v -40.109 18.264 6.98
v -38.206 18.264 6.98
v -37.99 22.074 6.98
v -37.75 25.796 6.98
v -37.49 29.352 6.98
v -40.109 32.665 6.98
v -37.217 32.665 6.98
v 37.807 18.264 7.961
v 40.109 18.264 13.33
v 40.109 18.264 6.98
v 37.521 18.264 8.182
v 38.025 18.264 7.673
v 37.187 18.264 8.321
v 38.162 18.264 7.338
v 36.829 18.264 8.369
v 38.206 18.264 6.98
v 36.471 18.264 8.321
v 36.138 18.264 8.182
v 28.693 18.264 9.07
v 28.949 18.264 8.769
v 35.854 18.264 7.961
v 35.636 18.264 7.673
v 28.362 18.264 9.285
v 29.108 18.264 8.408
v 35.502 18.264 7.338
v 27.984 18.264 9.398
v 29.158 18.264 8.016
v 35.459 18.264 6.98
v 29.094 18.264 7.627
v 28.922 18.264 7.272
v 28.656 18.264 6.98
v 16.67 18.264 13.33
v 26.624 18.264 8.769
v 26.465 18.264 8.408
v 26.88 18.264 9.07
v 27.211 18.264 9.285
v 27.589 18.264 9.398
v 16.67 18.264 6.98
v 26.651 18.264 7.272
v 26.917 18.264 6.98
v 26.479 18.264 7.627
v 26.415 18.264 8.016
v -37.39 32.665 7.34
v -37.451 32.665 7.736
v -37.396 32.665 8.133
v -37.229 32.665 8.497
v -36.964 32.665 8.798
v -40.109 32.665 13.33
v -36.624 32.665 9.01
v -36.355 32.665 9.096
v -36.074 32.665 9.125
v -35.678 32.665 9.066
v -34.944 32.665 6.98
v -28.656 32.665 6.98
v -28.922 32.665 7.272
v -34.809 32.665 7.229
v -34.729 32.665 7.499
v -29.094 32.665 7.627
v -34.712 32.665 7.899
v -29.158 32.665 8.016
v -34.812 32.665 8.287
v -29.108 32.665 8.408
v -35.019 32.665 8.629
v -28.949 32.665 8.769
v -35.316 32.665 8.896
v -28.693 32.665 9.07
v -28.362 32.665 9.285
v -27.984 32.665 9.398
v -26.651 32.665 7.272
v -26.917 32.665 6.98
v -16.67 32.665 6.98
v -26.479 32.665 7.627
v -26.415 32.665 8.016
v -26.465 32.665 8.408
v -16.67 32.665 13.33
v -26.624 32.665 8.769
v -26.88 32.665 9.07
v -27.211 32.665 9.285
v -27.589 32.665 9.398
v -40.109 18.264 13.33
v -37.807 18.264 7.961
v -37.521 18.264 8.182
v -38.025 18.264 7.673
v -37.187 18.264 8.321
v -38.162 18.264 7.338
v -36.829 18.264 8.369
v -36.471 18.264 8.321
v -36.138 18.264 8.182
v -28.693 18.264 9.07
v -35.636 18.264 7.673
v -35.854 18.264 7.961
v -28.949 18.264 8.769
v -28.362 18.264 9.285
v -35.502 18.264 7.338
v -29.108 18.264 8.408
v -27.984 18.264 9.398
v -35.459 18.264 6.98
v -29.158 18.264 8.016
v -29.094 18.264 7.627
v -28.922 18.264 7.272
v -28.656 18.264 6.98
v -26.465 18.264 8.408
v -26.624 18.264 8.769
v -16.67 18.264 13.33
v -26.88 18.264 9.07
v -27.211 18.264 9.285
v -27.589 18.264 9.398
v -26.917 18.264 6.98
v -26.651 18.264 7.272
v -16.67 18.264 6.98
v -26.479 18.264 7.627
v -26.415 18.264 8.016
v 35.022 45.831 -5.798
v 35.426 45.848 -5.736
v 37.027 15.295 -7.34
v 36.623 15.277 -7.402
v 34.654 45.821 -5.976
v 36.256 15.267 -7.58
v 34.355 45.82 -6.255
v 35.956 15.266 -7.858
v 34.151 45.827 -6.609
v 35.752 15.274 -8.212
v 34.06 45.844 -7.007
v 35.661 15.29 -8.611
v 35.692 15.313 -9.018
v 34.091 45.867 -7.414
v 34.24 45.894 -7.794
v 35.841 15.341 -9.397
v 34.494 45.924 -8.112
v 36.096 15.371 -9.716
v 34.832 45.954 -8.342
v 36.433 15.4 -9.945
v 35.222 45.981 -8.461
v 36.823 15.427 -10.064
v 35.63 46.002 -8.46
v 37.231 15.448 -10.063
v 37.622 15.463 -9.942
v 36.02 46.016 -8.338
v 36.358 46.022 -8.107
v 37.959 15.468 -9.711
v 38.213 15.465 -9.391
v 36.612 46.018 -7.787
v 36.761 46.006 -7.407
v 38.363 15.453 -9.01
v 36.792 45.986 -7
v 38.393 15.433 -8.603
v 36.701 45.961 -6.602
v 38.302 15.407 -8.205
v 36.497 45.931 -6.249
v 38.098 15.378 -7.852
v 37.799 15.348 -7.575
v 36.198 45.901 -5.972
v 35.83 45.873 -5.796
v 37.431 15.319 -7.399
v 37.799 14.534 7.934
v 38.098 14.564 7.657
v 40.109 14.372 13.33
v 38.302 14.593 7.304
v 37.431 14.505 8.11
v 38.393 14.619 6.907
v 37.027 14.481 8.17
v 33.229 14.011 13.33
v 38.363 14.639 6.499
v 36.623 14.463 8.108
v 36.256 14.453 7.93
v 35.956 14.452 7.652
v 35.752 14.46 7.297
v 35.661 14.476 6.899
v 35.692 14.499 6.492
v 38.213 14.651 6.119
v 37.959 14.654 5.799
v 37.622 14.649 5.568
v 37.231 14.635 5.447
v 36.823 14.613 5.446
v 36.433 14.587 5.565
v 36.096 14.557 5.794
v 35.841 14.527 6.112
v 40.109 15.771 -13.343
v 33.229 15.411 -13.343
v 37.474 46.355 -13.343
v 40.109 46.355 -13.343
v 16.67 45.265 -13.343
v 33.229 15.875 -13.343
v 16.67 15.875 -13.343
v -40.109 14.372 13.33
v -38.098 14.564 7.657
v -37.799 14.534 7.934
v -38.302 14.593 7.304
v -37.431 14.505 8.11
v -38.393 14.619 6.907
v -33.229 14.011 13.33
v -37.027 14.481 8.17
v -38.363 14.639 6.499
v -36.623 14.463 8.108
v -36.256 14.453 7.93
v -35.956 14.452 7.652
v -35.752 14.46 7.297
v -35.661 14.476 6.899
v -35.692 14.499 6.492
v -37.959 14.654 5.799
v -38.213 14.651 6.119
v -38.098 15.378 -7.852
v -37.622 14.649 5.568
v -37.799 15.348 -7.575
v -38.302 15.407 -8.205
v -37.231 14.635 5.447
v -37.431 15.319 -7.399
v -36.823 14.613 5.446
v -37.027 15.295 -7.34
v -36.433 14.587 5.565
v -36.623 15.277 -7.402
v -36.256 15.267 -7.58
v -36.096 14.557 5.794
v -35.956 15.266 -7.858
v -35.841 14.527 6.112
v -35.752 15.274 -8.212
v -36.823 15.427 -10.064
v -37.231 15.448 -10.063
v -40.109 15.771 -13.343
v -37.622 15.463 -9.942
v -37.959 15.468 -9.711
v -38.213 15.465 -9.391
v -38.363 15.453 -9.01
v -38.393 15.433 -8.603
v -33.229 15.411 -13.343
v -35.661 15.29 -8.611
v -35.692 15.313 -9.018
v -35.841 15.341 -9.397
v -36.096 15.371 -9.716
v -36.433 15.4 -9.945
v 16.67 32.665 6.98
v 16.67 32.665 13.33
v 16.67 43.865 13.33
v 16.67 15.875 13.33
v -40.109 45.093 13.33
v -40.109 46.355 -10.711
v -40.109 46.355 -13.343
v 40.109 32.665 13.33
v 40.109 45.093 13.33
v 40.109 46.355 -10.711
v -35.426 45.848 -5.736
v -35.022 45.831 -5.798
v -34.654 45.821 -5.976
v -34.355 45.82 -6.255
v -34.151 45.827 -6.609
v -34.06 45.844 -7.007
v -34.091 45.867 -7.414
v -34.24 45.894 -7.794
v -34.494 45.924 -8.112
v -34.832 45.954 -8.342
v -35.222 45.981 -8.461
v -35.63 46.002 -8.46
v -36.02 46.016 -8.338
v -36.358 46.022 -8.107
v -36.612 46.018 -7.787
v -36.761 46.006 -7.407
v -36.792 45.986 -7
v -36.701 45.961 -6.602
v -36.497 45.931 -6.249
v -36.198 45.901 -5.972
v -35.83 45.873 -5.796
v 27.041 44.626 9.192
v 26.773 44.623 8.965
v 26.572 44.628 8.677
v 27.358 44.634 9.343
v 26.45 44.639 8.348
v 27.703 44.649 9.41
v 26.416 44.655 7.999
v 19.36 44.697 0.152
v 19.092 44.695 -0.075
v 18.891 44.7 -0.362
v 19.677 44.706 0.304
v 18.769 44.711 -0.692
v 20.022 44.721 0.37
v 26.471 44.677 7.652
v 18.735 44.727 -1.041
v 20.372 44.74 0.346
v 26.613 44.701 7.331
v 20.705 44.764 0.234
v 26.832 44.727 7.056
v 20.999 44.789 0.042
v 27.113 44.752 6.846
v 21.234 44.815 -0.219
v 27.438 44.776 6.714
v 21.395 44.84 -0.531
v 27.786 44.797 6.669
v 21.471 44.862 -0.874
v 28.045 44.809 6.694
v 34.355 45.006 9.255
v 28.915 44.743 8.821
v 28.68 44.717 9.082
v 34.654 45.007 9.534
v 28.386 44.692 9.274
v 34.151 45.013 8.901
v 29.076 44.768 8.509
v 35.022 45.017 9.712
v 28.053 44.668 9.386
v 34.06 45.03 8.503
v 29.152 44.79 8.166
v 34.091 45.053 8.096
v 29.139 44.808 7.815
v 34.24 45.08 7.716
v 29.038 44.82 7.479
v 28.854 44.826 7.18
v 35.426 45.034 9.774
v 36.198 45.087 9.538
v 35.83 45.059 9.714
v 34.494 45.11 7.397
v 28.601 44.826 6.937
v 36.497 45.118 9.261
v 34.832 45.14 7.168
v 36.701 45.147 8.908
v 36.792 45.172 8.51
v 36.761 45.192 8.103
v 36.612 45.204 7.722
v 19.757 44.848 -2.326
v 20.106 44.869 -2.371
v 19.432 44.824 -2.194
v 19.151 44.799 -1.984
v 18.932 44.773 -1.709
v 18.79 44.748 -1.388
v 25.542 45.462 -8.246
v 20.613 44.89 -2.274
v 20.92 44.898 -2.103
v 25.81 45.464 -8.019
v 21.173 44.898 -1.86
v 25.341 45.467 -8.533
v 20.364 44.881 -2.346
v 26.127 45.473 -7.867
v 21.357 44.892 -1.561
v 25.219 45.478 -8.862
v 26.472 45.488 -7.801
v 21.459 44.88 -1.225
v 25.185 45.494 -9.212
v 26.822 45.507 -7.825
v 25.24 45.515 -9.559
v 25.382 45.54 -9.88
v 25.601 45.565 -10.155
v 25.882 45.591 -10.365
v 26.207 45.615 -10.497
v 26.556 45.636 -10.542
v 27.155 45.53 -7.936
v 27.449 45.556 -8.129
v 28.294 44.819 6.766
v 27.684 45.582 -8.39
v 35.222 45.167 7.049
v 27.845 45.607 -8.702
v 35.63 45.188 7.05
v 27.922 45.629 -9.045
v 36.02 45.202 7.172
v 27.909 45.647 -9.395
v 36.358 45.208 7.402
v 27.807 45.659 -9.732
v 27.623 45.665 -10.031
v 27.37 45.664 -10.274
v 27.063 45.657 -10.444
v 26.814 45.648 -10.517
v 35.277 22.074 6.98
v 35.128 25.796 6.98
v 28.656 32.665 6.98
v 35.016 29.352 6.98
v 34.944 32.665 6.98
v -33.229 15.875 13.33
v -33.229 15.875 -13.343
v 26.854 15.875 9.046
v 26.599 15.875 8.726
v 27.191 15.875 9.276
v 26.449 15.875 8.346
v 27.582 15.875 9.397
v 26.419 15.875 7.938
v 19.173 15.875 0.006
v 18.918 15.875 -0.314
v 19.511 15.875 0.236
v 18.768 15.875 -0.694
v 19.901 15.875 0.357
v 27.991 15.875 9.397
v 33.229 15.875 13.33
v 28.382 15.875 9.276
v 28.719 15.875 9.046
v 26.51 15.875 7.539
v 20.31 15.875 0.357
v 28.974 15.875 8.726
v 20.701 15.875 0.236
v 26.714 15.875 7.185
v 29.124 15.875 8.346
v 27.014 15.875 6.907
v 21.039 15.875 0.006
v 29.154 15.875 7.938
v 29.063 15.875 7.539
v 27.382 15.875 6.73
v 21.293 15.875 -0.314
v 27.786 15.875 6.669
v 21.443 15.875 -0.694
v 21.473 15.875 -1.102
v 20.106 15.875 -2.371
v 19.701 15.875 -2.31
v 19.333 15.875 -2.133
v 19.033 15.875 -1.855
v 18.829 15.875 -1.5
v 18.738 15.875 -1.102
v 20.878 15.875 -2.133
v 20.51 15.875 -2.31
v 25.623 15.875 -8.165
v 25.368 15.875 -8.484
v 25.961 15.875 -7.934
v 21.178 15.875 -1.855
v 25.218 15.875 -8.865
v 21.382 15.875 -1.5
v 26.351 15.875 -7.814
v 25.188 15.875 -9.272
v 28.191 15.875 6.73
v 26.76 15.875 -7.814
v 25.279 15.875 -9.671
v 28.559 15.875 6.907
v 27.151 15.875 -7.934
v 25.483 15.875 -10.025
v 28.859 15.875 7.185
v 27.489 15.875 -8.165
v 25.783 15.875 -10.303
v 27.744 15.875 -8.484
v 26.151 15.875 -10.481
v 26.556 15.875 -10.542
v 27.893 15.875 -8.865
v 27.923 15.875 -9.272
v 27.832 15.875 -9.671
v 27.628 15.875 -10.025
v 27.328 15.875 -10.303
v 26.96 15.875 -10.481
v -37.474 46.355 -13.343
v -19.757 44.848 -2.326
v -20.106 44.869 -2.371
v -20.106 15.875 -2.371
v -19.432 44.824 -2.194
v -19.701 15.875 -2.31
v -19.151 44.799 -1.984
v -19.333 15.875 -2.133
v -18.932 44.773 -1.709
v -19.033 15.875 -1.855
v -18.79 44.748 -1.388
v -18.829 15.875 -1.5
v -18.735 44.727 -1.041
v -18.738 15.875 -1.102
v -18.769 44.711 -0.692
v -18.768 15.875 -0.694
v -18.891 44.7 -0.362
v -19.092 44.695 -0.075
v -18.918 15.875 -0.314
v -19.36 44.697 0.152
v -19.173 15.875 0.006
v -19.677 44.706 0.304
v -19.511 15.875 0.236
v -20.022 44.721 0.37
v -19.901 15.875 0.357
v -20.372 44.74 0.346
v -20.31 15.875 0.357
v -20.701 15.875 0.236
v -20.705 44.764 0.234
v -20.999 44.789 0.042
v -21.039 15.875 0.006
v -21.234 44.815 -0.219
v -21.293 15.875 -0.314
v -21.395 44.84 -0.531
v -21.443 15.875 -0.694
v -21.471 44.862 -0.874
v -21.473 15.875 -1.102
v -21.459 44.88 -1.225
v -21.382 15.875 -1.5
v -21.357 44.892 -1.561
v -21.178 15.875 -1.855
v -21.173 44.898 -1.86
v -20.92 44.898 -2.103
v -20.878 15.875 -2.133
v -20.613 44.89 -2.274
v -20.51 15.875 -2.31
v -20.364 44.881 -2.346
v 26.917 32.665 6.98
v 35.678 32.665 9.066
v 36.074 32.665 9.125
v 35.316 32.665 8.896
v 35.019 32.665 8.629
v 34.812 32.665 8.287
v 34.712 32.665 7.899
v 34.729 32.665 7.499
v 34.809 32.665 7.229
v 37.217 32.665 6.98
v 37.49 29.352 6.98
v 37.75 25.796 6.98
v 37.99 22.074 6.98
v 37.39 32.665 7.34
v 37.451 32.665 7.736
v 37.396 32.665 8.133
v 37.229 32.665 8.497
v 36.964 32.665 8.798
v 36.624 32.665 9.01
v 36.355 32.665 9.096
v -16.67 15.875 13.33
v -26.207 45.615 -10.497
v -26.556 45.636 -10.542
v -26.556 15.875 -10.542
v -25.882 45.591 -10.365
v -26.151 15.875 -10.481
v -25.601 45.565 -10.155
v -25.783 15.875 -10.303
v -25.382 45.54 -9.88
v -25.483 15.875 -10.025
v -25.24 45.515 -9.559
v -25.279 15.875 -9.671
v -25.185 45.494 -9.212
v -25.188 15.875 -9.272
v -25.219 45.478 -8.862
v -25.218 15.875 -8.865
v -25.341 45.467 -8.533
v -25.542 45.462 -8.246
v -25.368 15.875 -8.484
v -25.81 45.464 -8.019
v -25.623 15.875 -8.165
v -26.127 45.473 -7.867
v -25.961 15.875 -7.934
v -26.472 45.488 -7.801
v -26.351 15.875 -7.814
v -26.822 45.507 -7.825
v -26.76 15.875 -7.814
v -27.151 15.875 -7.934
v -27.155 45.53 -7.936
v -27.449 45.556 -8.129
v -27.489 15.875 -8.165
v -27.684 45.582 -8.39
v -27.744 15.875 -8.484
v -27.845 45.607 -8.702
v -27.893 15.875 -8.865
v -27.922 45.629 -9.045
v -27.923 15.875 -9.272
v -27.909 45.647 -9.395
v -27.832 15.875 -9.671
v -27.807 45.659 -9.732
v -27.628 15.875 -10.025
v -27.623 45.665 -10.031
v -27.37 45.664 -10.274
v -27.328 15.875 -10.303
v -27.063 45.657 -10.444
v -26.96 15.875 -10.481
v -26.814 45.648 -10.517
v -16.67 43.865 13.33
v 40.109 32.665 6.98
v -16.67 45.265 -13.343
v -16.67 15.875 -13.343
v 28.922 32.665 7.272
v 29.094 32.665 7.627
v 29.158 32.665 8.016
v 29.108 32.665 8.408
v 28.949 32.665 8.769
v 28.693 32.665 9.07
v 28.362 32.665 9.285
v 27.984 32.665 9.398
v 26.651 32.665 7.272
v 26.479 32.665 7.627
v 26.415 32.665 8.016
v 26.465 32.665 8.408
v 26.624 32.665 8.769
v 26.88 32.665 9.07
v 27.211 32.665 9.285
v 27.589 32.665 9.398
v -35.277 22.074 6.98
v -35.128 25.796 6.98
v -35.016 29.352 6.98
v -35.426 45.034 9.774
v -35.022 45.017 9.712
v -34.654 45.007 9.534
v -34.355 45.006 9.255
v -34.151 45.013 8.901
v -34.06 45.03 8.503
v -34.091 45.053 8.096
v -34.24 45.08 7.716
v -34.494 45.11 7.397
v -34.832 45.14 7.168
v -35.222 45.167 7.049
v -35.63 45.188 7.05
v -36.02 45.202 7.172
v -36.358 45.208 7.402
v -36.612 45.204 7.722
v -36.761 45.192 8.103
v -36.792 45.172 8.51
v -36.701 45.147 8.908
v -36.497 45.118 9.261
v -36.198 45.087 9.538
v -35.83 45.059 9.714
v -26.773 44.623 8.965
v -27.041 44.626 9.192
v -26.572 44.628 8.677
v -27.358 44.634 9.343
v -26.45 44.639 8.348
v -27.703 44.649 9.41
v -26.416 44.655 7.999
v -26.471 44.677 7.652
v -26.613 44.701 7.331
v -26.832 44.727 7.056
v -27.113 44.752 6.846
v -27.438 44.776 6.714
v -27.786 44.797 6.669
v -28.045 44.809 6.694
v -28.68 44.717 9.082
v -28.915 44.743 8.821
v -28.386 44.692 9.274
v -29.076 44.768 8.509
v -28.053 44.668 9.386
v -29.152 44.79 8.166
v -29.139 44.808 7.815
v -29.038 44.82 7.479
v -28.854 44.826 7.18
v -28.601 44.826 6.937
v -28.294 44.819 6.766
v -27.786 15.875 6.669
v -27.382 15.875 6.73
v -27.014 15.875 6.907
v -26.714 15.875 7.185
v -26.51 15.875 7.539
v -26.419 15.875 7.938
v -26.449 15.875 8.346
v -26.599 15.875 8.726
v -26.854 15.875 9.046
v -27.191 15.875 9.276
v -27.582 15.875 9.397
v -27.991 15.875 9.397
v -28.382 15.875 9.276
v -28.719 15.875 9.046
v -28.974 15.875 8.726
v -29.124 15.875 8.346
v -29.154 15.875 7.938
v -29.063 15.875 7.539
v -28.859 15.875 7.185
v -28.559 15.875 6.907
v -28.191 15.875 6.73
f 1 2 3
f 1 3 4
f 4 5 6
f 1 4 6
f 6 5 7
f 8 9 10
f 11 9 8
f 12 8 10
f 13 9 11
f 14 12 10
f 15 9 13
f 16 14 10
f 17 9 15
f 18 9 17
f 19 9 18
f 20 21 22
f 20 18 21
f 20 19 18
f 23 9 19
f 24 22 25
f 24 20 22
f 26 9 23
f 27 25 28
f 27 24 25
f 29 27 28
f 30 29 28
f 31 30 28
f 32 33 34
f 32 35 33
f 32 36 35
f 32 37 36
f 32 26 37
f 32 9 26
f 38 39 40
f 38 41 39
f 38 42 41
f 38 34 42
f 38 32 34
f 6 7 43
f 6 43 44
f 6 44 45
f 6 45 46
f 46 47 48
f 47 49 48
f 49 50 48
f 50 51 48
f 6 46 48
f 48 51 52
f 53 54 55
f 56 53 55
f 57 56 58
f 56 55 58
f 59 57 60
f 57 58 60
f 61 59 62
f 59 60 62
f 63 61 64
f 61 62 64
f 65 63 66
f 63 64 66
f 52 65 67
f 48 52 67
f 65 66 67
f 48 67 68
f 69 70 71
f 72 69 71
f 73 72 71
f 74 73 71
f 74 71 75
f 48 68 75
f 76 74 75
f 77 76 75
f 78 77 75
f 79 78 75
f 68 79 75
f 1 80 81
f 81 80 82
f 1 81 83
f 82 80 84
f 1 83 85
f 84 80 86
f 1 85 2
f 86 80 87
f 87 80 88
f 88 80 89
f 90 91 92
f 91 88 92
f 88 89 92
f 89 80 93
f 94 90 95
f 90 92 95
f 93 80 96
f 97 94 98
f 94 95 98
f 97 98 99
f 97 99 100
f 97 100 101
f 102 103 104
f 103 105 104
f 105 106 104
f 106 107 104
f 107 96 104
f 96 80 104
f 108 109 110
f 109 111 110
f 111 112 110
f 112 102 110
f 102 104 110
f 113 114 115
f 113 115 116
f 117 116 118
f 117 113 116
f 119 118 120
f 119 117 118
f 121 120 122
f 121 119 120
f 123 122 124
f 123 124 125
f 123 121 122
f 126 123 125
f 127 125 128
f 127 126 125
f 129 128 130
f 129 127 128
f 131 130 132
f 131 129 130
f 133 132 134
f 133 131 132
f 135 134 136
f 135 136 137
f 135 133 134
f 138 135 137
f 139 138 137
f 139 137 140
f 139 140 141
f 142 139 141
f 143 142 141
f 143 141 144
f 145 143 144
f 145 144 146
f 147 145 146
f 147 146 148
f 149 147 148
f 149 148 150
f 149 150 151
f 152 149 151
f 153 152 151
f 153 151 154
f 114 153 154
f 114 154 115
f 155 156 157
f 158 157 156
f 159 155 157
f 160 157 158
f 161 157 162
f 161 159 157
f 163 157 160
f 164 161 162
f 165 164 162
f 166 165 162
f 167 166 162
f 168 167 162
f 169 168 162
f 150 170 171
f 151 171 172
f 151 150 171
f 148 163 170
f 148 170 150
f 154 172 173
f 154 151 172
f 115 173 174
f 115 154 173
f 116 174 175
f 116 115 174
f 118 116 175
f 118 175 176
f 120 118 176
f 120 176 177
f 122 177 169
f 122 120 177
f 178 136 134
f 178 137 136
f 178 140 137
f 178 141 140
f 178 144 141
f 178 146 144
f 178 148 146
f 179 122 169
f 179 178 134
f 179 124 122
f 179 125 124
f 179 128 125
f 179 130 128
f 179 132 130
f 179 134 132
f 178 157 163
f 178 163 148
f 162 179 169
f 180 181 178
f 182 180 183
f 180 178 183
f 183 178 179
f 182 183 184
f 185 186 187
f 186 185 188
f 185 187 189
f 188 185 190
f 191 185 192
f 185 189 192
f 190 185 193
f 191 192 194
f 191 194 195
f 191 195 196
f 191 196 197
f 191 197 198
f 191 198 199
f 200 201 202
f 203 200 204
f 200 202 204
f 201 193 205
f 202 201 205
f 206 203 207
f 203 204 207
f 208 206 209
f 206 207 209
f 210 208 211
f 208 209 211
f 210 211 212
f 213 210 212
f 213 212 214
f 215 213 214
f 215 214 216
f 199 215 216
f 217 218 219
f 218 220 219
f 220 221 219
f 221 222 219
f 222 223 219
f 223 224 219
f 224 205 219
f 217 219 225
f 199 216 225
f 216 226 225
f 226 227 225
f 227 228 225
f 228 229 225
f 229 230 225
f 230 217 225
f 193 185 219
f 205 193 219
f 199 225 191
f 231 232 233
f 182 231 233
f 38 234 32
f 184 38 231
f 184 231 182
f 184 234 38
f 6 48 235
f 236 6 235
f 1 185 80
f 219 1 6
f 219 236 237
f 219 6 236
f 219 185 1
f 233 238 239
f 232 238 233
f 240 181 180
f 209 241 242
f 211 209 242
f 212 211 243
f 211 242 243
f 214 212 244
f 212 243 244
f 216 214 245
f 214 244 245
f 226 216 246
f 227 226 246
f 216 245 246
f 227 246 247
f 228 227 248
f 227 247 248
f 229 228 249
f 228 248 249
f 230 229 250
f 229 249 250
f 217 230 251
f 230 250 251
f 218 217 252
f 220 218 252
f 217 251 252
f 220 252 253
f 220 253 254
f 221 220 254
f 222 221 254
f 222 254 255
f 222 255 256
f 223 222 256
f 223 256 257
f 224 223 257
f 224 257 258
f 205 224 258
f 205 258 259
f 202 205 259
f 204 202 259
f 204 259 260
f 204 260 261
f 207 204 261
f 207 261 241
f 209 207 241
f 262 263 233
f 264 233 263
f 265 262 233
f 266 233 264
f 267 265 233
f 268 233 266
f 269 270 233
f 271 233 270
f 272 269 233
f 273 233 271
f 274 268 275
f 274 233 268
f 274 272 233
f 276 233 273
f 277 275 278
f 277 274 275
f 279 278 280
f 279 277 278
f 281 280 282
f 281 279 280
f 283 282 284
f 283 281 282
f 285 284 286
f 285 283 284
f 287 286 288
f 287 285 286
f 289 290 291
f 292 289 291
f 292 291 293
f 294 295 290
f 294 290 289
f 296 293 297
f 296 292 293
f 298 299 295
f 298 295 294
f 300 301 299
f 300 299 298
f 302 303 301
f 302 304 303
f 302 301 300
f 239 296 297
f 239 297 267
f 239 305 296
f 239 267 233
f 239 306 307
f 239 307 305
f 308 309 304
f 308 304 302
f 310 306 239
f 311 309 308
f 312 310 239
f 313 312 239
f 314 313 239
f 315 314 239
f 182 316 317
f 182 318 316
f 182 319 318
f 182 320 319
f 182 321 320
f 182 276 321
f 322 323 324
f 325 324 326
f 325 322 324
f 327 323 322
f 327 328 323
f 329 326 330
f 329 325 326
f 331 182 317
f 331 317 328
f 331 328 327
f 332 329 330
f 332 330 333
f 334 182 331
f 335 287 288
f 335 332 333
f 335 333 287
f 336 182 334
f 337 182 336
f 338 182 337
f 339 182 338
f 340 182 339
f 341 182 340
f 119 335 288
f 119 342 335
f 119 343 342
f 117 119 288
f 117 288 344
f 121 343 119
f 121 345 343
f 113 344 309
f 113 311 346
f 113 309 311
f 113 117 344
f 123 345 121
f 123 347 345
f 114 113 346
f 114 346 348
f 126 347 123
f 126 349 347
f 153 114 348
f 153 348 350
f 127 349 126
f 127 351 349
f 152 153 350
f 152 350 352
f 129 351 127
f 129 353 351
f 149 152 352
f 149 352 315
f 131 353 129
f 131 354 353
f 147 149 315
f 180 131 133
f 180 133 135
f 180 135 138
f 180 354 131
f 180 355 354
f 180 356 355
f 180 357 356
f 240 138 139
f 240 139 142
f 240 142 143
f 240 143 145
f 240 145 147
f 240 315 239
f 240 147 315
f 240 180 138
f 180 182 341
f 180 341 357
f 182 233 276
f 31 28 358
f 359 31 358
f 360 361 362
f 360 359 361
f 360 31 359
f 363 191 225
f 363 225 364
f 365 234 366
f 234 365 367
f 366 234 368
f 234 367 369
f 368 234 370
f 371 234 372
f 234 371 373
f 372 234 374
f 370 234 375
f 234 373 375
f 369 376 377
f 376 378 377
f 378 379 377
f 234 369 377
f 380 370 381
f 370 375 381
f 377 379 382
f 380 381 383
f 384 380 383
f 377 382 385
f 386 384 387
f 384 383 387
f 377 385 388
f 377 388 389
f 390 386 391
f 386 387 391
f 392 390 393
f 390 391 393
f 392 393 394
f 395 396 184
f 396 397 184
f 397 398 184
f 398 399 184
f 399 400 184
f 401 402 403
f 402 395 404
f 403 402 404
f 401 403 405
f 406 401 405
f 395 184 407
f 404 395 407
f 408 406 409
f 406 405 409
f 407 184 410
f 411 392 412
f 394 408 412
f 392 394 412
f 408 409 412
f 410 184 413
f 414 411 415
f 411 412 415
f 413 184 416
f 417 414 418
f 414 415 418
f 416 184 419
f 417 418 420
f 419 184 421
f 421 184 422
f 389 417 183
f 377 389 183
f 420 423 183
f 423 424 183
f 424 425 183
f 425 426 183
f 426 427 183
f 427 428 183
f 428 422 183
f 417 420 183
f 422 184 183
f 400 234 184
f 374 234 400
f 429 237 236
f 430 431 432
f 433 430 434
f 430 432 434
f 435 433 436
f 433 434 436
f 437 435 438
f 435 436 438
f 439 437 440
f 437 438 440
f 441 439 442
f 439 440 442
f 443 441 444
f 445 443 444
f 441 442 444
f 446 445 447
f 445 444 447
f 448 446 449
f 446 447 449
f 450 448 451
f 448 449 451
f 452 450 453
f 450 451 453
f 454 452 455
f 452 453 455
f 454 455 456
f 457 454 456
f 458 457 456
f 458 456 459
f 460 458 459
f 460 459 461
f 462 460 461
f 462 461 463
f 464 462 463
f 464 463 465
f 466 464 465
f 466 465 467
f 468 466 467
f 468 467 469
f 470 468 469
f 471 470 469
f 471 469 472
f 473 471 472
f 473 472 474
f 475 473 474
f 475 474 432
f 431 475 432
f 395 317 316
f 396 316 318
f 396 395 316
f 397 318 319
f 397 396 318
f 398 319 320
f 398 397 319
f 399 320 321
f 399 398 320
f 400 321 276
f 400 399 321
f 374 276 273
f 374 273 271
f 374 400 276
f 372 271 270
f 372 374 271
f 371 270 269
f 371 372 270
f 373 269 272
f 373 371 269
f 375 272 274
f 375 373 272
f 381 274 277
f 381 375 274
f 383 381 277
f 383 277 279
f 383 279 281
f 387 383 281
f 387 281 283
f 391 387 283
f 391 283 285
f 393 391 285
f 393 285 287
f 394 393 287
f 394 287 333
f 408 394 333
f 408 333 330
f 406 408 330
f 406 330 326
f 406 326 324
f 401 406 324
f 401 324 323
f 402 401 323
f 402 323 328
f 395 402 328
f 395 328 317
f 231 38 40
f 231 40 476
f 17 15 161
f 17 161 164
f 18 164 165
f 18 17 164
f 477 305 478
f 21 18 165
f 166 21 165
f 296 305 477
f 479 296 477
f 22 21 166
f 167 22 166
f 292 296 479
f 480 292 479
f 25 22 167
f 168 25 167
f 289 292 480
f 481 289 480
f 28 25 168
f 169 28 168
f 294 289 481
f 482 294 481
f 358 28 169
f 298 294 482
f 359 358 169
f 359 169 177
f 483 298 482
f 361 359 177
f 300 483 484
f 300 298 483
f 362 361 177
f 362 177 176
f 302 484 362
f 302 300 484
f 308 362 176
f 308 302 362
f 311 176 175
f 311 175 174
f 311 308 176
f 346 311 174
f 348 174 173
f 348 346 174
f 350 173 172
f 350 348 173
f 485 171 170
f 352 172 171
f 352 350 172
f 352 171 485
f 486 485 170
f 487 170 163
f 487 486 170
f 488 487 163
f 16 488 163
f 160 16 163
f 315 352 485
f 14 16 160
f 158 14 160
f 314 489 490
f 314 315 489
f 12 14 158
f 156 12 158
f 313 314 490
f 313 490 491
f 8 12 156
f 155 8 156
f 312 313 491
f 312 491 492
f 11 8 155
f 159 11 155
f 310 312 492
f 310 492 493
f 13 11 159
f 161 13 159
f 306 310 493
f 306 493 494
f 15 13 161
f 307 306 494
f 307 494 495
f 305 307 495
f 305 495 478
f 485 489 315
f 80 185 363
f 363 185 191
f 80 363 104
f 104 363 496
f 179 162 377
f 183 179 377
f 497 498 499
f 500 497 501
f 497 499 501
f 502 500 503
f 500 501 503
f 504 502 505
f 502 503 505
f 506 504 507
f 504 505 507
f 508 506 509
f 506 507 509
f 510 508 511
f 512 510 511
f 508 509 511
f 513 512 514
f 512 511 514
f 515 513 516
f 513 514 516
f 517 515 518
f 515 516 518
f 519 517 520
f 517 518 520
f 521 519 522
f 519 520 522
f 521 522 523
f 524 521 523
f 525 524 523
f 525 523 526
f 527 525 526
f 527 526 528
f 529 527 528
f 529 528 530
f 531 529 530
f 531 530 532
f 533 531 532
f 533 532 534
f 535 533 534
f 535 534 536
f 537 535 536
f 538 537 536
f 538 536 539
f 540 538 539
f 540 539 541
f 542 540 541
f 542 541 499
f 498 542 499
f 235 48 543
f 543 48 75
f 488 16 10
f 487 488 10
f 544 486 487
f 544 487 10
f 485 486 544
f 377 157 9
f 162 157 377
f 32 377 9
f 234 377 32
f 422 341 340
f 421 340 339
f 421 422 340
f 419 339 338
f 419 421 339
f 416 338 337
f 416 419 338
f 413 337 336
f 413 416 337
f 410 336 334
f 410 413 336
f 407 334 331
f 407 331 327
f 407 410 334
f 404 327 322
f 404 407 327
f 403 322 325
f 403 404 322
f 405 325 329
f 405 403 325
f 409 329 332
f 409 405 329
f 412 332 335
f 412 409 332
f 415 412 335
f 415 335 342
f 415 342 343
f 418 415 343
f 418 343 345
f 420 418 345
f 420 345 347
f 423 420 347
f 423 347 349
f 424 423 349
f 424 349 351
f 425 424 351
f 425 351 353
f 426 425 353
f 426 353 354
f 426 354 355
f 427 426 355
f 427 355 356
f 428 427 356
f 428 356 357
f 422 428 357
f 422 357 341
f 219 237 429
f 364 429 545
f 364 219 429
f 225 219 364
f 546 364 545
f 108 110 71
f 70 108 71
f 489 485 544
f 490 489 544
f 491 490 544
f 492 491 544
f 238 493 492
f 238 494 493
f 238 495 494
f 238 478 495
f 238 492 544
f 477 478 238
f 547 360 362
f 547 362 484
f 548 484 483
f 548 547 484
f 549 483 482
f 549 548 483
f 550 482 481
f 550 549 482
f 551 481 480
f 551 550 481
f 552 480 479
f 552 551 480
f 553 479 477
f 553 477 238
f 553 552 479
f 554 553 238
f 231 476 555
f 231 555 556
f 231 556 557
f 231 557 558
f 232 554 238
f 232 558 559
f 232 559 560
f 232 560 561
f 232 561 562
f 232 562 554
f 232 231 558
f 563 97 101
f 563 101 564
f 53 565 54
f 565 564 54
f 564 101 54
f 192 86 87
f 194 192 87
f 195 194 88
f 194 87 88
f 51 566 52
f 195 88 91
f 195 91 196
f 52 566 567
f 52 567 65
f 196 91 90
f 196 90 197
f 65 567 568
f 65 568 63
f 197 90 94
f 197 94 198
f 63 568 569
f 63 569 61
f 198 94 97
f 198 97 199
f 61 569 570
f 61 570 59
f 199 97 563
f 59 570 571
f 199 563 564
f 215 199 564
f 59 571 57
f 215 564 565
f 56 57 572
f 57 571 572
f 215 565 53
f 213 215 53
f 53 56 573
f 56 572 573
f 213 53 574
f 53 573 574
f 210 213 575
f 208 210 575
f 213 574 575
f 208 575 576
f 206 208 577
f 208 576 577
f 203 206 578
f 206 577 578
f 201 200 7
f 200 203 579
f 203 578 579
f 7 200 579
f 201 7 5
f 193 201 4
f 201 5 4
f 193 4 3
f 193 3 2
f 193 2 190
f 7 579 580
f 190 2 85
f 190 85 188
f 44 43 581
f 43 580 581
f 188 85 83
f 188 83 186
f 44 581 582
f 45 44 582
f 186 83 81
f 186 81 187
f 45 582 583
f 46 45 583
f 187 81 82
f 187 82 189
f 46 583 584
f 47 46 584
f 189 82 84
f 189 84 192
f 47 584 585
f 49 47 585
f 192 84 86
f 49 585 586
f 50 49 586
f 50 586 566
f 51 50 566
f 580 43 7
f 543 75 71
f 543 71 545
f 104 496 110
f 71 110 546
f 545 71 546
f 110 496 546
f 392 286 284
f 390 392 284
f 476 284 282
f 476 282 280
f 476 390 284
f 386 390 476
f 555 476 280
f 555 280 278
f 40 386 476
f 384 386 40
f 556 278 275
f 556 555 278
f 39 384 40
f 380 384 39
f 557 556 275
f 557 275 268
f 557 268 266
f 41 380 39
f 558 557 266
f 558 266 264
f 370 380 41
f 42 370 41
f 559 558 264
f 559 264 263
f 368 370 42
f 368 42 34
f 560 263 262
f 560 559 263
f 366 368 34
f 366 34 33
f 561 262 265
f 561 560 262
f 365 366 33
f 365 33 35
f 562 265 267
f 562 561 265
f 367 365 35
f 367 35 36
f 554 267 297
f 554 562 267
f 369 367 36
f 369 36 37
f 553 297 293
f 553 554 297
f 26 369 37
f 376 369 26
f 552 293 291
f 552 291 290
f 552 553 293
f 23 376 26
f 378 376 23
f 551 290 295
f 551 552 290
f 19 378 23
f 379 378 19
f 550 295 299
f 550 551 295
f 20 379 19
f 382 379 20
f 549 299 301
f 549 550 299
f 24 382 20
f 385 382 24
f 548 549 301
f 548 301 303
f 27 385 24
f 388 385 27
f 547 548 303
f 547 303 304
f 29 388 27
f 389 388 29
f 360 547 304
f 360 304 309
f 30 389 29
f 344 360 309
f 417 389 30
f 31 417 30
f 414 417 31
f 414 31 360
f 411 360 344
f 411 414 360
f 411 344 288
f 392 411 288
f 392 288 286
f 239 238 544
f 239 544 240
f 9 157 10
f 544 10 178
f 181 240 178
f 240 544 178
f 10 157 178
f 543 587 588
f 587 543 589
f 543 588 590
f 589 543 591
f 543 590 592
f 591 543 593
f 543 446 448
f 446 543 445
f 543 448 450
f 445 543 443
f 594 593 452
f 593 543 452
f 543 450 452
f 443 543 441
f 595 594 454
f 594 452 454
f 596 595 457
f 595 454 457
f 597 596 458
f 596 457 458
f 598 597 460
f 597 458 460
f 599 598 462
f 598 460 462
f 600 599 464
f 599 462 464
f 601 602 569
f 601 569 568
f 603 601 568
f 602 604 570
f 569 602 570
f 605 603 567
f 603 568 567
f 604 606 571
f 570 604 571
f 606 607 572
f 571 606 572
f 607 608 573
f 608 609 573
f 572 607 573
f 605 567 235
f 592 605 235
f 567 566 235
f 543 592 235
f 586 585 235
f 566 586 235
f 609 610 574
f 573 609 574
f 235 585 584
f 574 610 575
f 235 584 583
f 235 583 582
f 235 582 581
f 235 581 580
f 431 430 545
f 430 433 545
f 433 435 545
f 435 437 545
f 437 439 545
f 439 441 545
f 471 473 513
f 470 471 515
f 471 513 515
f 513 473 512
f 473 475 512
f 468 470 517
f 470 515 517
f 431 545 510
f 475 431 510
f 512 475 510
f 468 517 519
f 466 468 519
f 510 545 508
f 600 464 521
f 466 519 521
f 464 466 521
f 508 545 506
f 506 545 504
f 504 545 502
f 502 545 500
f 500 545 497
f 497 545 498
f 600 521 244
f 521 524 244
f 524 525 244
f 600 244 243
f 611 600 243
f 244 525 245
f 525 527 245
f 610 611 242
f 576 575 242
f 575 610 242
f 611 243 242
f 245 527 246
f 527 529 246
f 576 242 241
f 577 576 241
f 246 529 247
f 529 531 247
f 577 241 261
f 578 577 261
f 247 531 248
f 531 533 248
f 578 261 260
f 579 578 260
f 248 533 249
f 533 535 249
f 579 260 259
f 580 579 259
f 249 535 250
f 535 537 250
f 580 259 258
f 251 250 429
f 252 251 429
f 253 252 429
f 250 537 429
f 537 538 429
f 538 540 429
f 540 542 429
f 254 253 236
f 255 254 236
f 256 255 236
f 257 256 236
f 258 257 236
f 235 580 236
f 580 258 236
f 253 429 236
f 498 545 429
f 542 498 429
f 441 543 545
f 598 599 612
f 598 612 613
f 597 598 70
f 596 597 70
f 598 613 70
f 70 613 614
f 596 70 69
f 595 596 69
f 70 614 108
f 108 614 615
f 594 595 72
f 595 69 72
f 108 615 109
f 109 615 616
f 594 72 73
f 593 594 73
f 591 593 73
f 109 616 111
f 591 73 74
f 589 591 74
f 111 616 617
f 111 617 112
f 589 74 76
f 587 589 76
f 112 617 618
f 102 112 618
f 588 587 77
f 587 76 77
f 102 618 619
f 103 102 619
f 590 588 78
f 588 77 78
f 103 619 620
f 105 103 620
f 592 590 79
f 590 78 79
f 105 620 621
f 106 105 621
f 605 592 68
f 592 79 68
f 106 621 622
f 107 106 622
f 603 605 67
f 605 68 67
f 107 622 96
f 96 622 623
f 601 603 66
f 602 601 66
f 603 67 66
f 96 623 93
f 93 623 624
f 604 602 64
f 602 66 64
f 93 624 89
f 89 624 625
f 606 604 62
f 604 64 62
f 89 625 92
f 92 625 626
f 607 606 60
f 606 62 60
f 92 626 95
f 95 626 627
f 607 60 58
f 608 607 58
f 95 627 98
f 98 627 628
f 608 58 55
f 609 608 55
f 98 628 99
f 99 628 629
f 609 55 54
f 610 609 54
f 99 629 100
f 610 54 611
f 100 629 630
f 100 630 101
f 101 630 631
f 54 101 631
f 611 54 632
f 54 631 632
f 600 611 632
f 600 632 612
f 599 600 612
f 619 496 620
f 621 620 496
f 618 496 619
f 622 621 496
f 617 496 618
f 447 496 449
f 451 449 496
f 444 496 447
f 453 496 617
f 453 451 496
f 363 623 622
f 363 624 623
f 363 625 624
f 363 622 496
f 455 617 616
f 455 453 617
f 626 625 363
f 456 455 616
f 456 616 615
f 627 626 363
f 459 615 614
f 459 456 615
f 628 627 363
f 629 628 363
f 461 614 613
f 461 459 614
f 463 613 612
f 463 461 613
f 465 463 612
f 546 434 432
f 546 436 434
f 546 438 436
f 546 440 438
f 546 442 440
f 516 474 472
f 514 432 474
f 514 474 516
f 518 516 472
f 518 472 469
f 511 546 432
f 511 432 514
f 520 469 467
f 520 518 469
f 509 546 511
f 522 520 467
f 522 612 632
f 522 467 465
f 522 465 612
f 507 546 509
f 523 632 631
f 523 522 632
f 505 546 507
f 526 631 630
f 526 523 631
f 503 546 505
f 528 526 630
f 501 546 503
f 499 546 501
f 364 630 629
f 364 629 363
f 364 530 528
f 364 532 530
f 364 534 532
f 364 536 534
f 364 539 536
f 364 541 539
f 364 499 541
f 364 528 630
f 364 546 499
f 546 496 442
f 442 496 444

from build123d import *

# Parameters (mm, degrees)
BOSS_EXTRUDE1_START      = 13.335
SKETCH1_W                = 23.438902935
SKETCH1_H                = 26.673096393
BOSS_EXTRUDE1_DEPTH      = 33.02
SKETCH2_W                = 22.160694563
SKETCH2_H                = 4.328355372
CUT_EXTRUDE1_DEPTH       = 30.48
SKETCH3_R                = 1.3716
A_ARM_HOLES_DEPTH        = 54.921009736
STEERING_ARM_NOTCH_DEPTH = 30.48
SKETCH5_R                = 1.3716
ANCHOR_HOLES_DEPTH       = 30.48


with BuildPart() as part:
    # Sketch1 → Boss-Extrude1 (new body)
    with BuildSketch(Plane(origin=(0, 0, 0), x_dir=(1, 0, 0), z_dir=(0, 1, 0)).offset(BOSS_EXTRUDE1_START)):
        with Locations((-28.389945686, 0.006605288)):
            Rectangle(SKETCH1_W, SKETCH1_H)
    extrude(amount=BOSS_EXTRUDE1_DEPTH)

    # SurfaceCut1
    split(bisect_by=Plane(origin=(2.277212667, 43.451806158, 2.28033779), x_dir=(-0.9986332910992534, 0.05219240899906097, 0.00273904201295754), z_dir=(-0.052264231633823974, -0.9972609476841369, -0.0523359562429442)), keep=Keep.TOP)

    # SurfaceCut2
    split(bisect_by=Plane(origin=(0.67596727, 12.898223874, 0.676894931), x_dir=(0.9986332910992533, -0.05219240899906121, -0.002739042012957531), z_dir=(0.052264231633824224, 0.9972609476841369, 0.05233595624294378)), keep=Keep.TOP)

    # Sketch2 → Cut-Extrude1 (cut)
    with BuildSketch(Plane(origin=(0, 0, -13.343153485), x_dir=(-1, 0, 0), z_dir=(0, 0, -1))):
        with Locations((22.148410537, 13.710822314)):
            Rectangle(SKETCH2_W, SKETCH2_H)
    extrude(amount=-CUT_EXTRUDE1_DEPTH, mode=Mode.SUBTRACT)

    # Sketch3 → A-Arm Holes (cut, through all)
    with BuildSketch(Plane(origin=(2.277212667, 43.451806158, 2.28033779), x_dir=(0.9986332910992534, -0.052192408999060975, -0.0027390420129575405), z_dir=(0.05226423163382398, 0.9972609476841369, 0.0523359562429442))):
        with Locations(Location((-37.754796672, -6.028488857, 0), (0, 0, 270))):
            Circle(SKETCH3_R)
        with Locations(Location((-37.754796672, 9.502629761, 0), (0, 0, 270))):
            Circle(SKETCH3_R)
    extrude(amount=-A_ARM_HOLES_DEPTH, mode=Mode.SUBTRACT)

    # Sketch4 → Steering Arm Notch (cut)
    with BuildSketch(Plane(origin=(-16.670494218, 0, 0), x_dir=(0, 0, -1), z_dir=(1, 0, 0))):
        Polygon((-13.329942908, 18.263758385), (-6.979942908, 18.263758385), (-6.979942908, 32.664722656), (-13.329942908, 32.664722656), (-16.160324711, 30.773717369), (-16.160324711, 16.881221926), align=None)
    extrude(amount=-STEERING_ARM_NOTCH_DEPTH, mode=Mode.SUBTRACT)

    # Sketch5 → Anchor Holes (cut)
    with BuildSketch(Plane.XZ.offset(-15.875)):
        with Locations(Location((-26.555704526, -9.169971692, 0), (0, 0, 270))):
            Circle(SKETCH5_R)
        with Locations(Location((-27.786476371, 8.040568412, 0), (0, 0, 270))):
            Circle(SKETCH5_R)
        with Locations(Location((-20.105647723, -0.999384842, 0), (0, 0, 270))):
            Circle(SKETCH5_R)
    extrude(amount=-ANCHOR_HOLES_DEPTH, mode=Mode.SUBTRACT)


with BuildPart() as body_2:
    # Mirror3: mirrored copy
    add(part.part.mirror(Plane(origin=(0, 0, 0), x_dir=(0, 0, 1), z_dir=(1, 0, 0))))


solid = Compound([part.part, body_2.part])
